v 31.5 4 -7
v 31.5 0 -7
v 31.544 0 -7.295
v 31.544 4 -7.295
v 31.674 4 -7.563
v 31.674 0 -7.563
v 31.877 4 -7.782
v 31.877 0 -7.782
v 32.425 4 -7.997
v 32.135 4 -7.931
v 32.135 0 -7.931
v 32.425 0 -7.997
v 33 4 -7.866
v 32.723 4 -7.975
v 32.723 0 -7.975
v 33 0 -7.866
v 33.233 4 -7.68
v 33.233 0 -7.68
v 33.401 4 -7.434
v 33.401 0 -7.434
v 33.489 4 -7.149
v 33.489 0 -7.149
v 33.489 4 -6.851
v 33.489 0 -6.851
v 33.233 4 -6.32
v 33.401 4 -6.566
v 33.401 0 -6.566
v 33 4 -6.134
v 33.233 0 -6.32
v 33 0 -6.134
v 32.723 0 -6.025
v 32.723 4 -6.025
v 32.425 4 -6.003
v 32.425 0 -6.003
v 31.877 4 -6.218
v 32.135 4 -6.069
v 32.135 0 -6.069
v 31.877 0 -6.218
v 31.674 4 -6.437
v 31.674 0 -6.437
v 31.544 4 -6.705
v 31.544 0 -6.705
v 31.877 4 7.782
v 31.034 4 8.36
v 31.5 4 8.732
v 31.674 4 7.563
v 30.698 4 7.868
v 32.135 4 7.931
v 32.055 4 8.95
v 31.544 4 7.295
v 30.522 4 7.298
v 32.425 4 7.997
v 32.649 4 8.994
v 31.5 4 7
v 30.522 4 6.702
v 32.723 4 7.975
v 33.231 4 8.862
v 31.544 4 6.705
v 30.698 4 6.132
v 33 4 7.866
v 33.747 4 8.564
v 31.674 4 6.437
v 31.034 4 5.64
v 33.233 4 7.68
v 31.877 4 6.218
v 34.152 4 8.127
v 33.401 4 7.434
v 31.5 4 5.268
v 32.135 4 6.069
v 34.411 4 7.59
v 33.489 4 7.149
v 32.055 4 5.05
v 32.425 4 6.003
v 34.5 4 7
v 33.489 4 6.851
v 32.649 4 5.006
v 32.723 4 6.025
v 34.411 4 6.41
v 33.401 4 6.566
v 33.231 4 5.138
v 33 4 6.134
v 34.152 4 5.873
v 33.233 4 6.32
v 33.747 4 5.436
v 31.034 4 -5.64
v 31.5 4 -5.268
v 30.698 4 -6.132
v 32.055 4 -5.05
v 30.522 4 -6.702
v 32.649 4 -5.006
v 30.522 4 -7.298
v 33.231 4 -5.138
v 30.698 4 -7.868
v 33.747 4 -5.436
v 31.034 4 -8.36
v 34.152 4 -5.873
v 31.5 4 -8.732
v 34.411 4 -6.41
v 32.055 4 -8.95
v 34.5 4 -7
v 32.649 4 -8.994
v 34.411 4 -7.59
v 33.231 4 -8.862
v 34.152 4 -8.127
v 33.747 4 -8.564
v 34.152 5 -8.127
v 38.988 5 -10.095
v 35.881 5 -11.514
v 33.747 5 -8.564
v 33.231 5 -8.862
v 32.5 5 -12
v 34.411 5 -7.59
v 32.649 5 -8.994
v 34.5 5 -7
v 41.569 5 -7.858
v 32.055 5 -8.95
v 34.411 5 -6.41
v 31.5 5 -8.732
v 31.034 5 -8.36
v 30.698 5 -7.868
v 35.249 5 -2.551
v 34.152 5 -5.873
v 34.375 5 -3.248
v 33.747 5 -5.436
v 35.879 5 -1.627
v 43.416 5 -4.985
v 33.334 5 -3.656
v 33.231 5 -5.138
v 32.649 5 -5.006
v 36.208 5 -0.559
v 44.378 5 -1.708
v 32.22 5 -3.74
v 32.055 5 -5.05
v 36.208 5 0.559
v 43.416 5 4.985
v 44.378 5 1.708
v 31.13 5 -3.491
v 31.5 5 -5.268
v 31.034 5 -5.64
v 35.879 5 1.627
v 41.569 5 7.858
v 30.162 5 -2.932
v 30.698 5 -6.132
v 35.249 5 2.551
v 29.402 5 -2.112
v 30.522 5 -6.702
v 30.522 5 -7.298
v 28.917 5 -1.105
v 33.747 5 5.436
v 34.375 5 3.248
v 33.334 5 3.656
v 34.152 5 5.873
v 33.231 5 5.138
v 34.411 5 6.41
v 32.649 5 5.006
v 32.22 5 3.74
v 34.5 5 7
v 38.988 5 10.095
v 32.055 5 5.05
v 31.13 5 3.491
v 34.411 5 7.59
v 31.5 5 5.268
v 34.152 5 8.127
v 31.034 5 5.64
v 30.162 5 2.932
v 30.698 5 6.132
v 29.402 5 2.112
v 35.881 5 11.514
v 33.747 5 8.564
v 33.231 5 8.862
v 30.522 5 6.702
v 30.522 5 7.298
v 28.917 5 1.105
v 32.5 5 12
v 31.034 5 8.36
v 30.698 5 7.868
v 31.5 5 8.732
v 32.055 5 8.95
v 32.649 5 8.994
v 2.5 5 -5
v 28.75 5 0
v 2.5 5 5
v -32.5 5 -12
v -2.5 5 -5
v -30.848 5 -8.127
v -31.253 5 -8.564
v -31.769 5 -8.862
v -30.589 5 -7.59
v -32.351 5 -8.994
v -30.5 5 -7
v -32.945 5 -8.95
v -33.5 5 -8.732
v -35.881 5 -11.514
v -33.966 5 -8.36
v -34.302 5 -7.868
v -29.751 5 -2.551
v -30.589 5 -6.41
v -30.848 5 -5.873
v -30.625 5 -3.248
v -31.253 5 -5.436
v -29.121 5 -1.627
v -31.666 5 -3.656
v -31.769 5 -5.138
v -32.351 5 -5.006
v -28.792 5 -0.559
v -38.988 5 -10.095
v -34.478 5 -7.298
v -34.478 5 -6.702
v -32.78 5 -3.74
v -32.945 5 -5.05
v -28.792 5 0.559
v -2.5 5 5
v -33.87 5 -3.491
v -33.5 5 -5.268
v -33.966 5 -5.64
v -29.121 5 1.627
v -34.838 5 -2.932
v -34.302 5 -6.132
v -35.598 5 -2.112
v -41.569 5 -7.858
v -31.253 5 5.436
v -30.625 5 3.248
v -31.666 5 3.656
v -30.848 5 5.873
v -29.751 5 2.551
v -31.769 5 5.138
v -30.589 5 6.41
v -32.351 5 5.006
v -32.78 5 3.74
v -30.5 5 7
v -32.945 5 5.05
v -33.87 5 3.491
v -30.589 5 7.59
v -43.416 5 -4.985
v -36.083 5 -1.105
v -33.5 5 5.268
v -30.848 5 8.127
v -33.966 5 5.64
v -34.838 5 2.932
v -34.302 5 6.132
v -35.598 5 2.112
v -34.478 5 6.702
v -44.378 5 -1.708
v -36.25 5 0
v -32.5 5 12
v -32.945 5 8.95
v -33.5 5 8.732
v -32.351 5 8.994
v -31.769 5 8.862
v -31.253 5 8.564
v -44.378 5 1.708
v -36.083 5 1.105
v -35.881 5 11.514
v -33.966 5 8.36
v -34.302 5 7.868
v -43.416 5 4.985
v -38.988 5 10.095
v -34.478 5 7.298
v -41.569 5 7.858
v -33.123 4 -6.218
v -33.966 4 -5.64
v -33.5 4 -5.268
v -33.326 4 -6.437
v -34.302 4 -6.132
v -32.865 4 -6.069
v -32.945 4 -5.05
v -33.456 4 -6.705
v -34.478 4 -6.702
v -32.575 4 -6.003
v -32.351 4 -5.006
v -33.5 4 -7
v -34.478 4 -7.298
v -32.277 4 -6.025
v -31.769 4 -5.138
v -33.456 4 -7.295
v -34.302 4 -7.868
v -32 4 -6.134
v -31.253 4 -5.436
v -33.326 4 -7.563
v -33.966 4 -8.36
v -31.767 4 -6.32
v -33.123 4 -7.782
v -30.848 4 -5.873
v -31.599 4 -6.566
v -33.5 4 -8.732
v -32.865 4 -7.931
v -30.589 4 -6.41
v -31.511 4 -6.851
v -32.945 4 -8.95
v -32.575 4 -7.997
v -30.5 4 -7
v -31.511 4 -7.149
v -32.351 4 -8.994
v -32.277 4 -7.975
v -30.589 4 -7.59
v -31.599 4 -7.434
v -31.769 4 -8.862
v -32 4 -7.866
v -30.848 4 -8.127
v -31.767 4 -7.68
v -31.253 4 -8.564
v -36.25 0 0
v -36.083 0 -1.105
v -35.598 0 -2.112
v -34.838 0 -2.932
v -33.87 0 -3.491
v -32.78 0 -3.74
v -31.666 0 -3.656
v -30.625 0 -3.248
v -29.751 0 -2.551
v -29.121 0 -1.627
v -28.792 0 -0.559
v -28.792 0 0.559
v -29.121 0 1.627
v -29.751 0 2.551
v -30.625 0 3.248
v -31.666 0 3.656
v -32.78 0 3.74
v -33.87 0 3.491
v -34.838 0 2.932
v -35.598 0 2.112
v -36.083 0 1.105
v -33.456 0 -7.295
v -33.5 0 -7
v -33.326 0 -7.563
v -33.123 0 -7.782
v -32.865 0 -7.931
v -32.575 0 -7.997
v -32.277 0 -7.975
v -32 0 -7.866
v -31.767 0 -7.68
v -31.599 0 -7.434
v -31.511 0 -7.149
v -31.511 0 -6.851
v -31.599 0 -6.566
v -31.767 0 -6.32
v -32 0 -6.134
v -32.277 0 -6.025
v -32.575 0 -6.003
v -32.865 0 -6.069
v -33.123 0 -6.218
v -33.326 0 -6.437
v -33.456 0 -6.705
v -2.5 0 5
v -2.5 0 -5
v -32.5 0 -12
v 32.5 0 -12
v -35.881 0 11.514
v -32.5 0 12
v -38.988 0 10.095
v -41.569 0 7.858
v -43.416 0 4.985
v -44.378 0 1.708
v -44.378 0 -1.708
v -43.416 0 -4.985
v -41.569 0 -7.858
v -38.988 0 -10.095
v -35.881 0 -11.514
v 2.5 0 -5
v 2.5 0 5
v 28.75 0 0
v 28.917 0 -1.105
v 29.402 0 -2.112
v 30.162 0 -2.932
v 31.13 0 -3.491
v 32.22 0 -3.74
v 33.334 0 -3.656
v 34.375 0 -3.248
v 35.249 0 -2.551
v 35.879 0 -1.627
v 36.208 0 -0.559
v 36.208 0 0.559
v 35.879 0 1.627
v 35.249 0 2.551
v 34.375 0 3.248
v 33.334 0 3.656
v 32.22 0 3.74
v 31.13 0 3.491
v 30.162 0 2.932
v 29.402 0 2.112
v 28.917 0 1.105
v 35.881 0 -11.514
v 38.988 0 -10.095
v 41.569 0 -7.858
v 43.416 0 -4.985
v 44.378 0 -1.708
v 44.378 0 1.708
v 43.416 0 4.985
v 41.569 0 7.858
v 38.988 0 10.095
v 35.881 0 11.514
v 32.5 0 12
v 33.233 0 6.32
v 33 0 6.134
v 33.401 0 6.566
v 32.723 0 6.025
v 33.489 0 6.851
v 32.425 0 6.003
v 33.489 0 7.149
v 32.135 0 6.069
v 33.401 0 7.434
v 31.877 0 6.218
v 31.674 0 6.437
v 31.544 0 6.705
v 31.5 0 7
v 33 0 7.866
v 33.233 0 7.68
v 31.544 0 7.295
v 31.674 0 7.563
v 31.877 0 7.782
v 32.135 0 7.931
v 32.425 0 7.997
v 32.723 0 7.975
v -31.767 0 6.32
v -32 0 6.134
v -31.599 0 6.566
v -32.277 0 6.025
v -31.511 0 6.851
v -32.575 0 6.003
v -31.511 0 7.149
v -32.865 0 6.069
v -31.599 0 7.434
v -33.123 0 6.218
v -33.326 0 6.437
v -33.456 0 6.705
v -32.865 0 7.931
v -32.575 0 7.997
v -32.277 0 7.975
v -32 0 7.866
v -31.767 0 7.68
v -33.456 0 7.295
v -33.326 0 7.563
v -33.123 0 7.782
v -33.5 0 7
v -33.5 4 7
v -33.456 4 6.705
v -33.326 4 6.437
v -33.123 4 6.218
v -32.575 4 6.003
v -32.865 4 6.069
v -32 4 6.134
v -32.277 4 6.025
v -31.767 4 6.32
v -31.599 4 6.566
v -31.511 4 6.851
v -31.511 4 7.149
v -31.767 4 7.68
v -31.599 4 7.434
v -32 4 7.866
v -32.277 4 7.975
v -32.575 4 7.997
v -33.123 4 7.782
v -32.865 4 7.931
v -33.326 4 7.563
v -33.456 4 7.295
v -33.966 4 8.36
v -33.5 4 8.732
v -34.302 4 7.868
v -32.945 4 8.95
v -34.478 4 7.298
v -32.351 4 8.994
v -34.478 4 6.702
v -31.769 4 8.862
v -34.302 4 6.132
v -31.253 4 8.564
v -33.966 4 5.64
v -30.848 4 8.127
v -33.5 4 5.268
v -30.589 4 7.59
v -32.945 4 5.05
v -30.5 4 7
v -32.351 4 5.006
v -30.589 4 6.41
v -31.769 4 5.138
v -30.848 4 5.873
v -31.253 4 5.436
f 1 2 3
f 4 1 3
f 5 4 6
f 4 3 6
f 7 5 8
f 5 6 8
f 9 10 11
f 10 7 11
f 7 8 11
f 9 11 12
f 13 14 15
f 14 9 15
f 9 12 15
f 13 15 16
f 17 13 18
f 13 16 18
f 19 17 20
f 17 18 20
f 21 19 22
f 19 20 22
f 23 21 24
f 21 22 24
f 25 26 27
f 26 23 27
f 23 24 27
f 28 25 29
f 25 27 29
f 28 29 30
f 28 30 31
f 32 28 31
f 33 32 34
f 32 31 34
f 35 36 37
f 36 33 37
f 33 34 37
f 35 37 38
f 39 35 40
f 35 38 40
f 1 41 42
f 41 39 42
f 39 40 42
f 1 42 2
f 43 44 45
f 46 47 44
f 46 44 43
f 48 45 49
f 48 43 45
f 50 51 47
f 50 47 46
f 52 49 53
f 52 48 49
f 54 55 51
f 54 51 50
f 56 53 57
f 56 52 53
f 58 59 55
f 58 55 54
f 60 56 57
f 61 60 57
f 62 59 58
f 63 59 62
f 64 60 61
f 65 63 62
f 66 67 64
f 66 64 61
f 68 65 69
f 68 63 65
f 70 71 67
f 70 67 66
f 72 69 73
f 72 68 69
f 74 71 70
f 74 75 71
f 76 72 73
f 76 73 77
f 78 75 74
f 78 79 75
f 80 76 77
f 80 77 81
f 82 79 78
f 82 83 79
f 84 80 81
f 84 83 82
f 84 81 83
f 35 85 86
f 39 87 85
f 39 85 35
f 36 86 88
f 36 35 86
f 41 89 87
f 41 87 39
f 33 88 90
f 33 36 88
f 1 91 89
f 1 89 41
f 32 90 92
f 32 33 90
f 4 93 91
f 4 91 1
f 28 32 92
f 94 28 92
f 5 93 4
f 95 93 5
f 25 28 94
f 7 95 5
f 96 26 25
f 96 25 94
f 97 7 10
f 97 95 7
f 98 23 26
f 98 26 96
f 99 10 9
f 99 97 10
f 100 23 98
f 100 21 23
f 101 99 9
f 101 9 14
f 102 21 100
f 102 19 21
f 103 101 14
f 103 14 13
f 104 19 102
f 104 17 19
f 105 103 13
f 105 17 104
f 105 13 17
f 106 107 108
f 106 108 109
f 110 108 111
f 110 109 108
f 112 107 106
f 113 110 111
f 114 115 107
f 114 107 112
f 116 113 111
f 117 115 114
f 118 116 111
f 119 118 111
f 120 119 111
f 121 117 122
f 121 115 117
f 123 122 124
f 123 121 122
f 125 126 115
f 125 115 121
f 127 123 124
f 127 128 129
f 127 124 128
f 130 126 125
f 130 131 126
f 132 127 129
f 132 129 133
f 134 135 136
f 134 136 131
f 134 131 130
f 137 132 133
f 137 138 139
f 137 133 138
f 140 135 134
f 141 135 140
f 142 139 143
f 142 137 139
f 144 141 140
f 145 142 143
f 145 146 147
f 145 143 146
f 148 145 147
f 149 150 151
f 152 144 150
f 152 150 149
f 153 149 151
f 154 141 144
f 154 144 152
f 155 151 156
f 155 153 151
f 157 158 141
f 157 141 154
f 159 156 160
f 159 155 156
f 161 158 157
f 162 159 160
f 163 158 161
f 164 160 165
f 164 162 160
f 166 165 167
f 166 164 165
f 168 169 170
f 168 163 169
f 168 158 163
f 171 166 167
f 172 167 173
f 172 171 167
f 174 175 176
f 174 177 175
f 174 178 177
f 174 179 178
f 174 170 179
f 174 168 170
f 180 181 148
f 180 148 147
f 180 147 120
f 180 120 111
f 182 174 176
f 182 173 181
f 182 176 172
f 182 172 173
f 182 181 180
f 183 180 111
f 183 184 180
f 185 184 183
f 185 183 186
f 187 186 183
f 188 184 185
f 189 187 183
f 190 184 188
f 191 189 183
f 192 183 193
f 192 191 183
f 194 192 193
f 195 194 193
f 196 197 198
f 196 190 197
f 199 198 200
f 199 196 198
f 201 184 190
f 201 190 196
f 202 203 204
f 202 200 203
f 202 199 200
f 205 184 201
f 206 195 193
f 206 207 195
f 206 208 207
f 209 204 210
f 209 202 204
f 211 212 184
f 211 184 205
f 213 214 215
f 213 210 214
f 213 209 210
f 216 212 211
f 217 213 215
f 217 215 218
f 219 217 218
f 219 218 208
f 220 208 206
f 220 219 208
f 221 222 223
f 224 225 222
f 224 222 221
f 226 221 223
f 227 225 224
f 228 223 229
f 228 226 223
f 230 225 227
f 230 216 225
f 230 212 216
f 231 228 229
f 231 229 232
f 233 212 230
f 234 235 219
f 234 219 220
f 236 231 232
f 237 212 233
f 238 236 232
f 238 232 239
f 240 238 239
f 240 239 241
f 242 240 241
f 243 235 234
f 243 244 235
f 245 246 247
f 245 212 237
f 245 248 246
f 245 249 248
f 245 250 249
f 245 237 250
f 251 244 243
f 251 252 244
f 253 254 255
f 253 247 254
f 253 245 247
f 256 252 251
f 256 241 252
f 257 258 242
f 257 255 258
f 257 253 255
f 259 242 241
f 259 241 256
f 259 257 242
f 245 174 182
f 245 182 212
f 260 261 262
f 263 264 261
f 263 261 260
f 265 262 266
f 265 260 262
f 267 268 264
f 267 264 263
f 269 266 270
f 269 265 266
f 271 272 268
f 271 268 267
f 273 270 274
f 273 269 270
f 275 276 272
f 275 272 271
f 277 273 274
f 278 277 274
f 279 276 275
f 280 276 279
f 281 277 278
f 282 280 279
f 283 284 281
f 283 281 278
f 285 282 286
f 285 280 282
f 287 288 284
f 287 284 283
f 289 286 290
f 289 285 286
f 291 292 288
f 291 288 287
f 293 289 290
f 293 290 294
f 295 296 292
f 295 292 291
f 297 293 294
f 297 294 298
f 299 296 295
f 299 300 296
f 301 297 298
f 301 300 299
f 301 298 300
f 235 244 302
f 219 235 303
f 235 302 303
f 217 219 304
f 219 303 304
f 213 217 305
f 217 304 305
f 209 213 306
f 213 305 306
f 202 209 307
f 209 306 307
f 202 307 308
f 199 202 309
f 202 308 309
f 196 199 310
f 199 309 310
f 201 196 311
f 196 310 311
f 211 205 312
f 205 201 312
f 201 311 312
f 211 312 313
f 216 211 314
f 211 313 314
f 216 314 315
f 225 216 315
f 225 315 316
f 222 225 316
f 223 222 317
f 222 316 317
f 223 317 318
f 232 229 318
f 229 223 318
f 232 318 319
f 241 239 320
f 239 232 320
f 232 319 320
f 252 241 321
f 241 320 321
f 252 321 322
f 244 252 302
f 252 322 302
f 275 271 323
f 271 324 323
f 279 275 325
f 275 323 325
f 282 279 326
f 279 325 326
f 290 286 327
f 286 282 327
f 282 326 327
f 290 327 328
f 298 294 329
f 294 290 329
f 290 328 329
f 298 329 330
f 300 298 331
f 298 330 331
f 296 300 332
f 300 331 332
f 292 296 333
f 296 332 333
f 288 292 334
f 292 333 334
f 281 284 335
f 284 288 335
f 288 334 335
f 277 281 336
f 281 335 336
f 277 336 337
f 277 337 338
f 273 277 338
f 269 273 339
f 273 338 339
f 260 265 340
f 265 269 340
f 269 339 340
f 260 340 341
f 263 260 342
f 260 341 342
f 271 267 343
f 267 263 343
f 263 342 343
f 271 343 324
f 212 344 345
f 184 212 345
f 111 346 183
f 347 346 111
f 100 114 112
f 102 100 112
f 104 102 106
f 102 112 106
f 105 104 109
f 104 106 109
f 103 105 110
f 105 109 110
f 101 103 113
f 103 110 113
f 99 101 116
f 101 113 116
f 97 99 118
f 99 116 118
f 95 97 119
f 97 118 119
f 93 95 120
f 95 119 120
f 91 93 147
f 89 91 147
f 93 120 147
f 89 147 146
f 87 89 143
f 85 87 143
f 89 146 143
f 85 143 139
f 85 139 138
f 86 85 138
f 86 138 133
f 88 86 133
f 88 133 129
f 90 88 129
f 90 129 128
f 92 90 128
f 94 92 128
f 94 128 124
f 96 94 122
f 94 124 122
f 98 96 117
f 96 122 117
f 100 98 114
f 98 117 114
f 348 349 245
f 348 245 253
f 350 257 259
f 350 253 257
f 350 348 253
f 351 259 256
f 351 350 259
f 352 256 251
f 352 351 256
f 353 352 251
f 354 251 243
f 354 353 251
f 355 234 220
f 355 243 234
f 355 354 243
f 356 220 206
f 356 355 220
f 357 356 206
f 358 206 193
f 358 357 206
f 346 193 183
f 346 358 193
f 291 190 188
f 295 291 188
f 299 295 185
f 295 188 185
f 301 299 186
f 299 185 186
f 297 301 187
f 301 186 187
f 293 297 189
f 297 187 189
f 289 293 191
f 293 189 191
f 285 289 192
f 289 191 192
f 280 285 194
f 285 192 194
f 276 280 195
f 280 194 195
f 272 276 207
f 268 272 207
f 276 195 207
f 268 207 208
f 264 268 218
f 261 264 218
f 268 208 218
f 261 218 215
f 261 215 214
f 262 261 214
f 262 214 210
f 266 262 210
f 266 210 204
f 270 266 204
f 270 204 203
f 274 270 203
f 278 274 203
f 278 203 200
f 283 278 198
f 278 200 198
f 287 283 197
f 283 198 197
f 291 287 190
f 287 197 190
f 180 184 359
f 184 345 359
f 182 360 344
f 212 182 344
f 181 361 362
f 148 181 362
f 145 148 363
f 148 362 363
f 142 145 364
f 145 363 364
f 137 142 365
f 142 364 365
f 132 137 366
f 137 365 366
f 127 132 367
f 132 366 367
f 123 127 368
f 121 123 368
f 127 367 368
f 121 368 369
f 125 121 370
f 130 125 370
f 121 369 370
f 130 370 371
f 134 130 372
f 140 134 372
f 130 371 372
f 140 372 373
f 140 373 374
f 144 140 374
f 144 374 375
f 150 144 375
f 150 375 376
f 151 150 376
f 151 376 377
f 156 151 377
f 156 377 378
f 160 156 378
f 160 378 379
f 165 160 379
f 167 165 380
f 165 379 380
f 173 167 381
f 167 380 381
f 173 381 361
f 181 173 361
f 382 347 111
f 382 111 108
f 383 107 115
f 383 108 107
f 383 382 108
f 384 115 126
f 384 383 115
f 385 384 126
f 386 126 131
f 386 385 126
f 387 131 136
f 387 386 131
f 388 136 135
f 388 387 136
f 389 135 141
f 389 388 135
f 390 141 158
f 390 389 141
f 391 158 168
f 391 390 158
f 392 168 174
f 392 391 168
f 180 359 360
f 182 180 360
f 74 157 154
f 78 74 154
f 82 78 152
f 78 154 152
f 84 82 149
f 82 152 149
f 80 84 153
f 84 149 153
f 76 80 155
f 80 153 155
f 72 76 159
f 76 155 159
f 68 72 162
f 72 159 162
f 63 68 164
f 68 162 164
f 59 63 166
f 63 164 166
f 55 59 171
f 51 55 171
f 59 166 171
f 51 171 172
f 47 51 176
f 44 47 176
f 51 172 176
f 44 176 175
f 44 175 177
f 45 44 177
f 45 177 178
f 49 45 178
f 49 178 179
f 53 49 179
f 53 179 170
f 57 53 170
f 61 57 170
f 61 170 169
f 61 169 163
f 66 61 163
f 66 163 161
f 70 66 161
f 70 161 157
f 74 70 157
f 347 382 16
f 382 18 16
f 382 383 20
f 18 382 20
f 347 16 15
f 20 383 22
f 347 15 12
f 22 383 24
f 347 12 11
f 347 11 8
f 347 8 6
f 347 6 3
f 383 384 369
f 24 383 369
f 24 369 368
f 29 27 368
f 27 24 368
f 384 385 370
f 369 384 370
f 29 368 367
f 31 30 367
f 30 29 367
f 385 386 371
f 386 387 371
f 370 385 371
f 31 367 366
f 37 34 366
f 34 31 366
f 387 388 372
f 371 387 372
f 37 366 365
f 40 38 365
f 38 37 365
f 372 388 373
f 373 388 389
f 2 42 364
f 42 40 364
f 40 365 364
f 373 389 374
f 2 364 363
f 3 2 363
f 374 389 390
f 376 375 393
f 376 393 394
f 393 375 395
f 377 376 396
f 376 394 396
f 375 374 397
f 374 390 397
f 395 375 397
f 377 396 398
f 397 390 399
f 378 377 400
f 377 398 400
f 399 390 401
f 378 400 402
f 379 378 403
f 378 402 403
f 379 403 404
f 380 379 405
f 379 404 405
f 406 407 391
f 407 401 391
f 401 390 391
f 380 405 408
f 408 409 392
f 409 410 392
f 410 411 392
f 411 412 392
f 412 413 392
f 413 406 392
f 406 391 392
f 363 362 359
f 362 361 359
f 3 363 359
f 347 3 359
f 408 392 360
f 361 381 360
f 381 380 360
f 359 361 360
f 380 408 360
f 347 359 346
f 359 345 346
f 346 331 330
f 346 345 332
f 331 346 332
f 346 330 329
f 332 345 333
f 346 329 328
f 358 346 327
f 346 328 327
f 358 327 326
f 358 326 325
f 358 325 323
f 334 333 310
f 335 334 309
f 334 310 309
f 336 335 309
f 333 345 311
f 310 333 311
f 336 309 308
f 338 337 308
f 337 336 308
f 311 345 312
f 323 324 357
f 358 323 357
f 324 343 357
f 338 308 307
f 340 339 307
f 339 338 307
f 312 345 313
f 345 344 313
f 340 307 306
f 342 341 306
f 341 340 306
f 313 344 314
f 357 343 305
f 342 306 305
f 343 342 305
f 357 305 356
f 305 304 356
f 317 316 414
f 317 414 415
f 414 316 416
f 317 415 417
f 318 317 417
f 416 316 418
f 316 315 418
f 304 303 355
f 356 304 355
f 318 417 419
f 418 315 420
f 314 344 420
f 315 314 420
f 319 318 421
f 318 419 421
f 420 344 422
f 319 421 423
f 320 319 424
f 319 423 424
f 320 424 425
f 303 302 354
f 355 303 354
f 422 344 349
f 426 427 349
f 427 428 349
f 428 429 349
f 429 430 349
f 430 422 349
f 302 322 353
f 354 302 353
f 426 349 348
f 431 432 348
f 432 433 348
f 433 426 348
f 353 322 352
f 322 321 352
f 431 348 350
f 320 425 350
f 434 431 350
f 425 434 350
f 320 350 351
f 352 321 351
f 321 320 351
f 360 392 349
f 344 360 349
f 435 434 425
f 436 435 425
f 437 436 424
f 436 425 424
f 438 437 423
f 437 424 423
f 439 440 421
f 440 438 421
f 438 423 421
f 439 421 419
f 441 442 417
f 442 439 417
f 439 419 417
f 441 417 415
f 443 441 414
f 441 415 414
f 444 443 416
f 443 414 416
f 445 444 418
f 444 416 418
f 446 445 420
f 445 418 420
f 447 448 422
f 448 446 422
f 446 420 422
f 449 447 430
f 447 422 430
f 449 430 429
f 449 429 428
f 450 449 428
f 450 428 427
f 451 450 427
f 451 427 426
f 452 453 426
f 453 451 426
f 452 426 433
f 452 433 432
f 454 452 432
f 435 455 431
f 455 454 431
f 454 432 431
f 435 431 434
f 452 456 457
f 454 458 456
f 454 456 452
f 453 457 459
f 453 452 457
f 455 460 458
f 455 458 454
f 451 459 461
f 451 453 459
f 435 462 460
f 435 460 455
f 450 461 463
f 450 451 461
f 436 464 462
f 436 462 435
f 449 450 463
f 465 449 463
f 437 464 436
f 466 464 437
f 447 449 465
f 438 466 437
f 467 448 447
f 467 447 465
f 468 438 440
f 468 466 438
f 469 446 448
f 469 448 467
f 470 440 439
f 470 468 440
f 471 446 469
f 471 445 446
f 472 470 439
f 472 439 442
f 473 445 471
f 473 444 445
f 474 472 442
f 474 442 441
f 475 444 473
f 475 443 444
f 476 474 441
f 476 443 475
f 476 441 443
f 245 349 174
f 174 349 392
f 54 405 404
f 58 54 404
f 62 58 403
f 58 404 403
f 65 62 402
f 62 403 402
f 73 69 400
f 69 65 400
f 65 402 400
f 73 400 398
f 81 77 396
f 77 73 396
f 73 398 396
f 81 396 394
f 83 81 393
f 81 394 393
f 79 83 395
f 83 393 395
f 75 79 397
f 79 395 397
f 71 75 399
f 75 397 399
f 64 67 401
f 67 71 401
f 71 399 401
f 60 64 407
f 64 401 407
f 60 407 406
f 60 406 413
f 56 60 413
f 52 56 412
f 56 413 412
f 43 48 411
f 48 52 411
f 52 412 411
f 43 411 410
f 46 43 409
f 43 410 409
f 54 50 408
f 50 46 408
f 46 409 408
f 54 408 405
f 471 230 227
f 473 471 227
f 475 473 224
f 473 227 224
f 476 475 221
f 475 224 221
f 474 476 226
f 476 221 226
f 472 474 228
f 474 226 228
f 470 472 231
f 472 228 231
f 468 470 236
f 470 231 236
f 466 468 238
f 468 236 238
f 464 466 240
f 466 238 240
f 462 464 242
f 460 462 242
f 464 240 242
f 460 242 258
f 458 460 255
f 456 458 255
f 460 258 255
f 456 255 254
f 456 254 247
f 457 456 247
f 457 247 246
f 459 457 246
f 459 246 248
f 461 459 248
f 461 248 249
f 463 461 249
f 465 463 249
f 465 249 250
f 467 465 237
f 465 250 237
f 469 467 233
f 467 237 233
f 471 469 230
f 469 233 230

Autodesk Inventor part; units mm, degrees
ref_plane "YZ Plane" through (0, 0, 0) normal (1, 0, 0) x (0, 1, 0)
ref_plane "XZ Plane" through (0, 0, 0) normal (0, 1, 0) x (-1, 0, 0)
ref_plane "XY Plane" through (0, 0, 0) normal (0, 0, 1) x (1, 0, 0)
sketch "Sketch1" plane through (0, 0, 0) normal (0, 1, 0) x (-1, 0, 0)
  circle A0 centre (32.5, 0) radius 12
  circle A1 centre (-32.5, 0) radius 12
  line L0 (32.5, 12) -> (-32.5, 12)
  line L1 (32.5, -12) -> (-32.5, -12)
  circle A2 centre (32.5, 0) radius 3.75
  circle A3 centre (-32.5, 0) radius 3.75
  line L2 (62.3, 0) -> (-62.3, 0) projected
  circle A4 centre (32.5, -7) radius 1
  circle A5 centre (32.5, 7) radius 1
  circle A6 centre (-32.5, -7) radius 1
  circle A7 centre (-32.5, 7) radius 1
  line L3 (2.5, -5) -> (-2.5, -5)
  line L4 (-2.5, -5) -> (-2.5, 5)
  line L5 (-2.5, 5) -> (2.5, 5)
  line L6 (2.5, 5) -> (2.5, -5)
  point P0 (0, 0)
  point P1 (0, 12)
  point P2 (2.5, 0)
  point P3 (0, -5)
  dimension "d5" = 65
  dimension "d6" = 24
  dimension "d7" = 7.5
  dimension "d17" = 2
  dimension "d18" = 7
  dimension "d19" = 7
  dimension "d25" = 5
  dimension "d26" = 10
extrude "Extrusion7" add sketch "Sketch1" along normal blind 5 contours L2 A2 A0 | A0 L2 A2 | A0 L2 L6 L5 L4 A1 L0 | L1 A1 L2 L4 L3 L6 A0 | A1 L2 A3 | A1 L2 A3
sketch "Sketch4" plane through (0, 5, 0) normal (0, 1, 0) x (1, 0, 0)
  circle A0 centre (-32.5, -7) radius 2
  circle A1 centre (-32.5, 7) radius 2
  circle A2 centre (32.5, -7) radius 2
  circle A3 centre (32.5, 7) radius 2
  circle A4 centre (-32.5, -7) radius 1 projected
  circle A5 centre (-32.5, 7) radius 1 projected
  circle A6 centre (32.5, -7) radius 1 projected
  circle A7 centre (32.5, 7) radius 1 projected
  point P0 (0, 0)
  dimension "d29" = 4
extrude "Extrusion8" cut sketch "Sketch4" against normal blind 1
equation "\"d6\" = sa_diameter"
equation "\"d25\" = b_mat_thickness"
equation "\"d27\" = b_mat_thickness"
equation "\"sa_diameter\" = 24"
equation "\"b_mat_thickness\" = 5"
properties part number "Middle_leg_a"
